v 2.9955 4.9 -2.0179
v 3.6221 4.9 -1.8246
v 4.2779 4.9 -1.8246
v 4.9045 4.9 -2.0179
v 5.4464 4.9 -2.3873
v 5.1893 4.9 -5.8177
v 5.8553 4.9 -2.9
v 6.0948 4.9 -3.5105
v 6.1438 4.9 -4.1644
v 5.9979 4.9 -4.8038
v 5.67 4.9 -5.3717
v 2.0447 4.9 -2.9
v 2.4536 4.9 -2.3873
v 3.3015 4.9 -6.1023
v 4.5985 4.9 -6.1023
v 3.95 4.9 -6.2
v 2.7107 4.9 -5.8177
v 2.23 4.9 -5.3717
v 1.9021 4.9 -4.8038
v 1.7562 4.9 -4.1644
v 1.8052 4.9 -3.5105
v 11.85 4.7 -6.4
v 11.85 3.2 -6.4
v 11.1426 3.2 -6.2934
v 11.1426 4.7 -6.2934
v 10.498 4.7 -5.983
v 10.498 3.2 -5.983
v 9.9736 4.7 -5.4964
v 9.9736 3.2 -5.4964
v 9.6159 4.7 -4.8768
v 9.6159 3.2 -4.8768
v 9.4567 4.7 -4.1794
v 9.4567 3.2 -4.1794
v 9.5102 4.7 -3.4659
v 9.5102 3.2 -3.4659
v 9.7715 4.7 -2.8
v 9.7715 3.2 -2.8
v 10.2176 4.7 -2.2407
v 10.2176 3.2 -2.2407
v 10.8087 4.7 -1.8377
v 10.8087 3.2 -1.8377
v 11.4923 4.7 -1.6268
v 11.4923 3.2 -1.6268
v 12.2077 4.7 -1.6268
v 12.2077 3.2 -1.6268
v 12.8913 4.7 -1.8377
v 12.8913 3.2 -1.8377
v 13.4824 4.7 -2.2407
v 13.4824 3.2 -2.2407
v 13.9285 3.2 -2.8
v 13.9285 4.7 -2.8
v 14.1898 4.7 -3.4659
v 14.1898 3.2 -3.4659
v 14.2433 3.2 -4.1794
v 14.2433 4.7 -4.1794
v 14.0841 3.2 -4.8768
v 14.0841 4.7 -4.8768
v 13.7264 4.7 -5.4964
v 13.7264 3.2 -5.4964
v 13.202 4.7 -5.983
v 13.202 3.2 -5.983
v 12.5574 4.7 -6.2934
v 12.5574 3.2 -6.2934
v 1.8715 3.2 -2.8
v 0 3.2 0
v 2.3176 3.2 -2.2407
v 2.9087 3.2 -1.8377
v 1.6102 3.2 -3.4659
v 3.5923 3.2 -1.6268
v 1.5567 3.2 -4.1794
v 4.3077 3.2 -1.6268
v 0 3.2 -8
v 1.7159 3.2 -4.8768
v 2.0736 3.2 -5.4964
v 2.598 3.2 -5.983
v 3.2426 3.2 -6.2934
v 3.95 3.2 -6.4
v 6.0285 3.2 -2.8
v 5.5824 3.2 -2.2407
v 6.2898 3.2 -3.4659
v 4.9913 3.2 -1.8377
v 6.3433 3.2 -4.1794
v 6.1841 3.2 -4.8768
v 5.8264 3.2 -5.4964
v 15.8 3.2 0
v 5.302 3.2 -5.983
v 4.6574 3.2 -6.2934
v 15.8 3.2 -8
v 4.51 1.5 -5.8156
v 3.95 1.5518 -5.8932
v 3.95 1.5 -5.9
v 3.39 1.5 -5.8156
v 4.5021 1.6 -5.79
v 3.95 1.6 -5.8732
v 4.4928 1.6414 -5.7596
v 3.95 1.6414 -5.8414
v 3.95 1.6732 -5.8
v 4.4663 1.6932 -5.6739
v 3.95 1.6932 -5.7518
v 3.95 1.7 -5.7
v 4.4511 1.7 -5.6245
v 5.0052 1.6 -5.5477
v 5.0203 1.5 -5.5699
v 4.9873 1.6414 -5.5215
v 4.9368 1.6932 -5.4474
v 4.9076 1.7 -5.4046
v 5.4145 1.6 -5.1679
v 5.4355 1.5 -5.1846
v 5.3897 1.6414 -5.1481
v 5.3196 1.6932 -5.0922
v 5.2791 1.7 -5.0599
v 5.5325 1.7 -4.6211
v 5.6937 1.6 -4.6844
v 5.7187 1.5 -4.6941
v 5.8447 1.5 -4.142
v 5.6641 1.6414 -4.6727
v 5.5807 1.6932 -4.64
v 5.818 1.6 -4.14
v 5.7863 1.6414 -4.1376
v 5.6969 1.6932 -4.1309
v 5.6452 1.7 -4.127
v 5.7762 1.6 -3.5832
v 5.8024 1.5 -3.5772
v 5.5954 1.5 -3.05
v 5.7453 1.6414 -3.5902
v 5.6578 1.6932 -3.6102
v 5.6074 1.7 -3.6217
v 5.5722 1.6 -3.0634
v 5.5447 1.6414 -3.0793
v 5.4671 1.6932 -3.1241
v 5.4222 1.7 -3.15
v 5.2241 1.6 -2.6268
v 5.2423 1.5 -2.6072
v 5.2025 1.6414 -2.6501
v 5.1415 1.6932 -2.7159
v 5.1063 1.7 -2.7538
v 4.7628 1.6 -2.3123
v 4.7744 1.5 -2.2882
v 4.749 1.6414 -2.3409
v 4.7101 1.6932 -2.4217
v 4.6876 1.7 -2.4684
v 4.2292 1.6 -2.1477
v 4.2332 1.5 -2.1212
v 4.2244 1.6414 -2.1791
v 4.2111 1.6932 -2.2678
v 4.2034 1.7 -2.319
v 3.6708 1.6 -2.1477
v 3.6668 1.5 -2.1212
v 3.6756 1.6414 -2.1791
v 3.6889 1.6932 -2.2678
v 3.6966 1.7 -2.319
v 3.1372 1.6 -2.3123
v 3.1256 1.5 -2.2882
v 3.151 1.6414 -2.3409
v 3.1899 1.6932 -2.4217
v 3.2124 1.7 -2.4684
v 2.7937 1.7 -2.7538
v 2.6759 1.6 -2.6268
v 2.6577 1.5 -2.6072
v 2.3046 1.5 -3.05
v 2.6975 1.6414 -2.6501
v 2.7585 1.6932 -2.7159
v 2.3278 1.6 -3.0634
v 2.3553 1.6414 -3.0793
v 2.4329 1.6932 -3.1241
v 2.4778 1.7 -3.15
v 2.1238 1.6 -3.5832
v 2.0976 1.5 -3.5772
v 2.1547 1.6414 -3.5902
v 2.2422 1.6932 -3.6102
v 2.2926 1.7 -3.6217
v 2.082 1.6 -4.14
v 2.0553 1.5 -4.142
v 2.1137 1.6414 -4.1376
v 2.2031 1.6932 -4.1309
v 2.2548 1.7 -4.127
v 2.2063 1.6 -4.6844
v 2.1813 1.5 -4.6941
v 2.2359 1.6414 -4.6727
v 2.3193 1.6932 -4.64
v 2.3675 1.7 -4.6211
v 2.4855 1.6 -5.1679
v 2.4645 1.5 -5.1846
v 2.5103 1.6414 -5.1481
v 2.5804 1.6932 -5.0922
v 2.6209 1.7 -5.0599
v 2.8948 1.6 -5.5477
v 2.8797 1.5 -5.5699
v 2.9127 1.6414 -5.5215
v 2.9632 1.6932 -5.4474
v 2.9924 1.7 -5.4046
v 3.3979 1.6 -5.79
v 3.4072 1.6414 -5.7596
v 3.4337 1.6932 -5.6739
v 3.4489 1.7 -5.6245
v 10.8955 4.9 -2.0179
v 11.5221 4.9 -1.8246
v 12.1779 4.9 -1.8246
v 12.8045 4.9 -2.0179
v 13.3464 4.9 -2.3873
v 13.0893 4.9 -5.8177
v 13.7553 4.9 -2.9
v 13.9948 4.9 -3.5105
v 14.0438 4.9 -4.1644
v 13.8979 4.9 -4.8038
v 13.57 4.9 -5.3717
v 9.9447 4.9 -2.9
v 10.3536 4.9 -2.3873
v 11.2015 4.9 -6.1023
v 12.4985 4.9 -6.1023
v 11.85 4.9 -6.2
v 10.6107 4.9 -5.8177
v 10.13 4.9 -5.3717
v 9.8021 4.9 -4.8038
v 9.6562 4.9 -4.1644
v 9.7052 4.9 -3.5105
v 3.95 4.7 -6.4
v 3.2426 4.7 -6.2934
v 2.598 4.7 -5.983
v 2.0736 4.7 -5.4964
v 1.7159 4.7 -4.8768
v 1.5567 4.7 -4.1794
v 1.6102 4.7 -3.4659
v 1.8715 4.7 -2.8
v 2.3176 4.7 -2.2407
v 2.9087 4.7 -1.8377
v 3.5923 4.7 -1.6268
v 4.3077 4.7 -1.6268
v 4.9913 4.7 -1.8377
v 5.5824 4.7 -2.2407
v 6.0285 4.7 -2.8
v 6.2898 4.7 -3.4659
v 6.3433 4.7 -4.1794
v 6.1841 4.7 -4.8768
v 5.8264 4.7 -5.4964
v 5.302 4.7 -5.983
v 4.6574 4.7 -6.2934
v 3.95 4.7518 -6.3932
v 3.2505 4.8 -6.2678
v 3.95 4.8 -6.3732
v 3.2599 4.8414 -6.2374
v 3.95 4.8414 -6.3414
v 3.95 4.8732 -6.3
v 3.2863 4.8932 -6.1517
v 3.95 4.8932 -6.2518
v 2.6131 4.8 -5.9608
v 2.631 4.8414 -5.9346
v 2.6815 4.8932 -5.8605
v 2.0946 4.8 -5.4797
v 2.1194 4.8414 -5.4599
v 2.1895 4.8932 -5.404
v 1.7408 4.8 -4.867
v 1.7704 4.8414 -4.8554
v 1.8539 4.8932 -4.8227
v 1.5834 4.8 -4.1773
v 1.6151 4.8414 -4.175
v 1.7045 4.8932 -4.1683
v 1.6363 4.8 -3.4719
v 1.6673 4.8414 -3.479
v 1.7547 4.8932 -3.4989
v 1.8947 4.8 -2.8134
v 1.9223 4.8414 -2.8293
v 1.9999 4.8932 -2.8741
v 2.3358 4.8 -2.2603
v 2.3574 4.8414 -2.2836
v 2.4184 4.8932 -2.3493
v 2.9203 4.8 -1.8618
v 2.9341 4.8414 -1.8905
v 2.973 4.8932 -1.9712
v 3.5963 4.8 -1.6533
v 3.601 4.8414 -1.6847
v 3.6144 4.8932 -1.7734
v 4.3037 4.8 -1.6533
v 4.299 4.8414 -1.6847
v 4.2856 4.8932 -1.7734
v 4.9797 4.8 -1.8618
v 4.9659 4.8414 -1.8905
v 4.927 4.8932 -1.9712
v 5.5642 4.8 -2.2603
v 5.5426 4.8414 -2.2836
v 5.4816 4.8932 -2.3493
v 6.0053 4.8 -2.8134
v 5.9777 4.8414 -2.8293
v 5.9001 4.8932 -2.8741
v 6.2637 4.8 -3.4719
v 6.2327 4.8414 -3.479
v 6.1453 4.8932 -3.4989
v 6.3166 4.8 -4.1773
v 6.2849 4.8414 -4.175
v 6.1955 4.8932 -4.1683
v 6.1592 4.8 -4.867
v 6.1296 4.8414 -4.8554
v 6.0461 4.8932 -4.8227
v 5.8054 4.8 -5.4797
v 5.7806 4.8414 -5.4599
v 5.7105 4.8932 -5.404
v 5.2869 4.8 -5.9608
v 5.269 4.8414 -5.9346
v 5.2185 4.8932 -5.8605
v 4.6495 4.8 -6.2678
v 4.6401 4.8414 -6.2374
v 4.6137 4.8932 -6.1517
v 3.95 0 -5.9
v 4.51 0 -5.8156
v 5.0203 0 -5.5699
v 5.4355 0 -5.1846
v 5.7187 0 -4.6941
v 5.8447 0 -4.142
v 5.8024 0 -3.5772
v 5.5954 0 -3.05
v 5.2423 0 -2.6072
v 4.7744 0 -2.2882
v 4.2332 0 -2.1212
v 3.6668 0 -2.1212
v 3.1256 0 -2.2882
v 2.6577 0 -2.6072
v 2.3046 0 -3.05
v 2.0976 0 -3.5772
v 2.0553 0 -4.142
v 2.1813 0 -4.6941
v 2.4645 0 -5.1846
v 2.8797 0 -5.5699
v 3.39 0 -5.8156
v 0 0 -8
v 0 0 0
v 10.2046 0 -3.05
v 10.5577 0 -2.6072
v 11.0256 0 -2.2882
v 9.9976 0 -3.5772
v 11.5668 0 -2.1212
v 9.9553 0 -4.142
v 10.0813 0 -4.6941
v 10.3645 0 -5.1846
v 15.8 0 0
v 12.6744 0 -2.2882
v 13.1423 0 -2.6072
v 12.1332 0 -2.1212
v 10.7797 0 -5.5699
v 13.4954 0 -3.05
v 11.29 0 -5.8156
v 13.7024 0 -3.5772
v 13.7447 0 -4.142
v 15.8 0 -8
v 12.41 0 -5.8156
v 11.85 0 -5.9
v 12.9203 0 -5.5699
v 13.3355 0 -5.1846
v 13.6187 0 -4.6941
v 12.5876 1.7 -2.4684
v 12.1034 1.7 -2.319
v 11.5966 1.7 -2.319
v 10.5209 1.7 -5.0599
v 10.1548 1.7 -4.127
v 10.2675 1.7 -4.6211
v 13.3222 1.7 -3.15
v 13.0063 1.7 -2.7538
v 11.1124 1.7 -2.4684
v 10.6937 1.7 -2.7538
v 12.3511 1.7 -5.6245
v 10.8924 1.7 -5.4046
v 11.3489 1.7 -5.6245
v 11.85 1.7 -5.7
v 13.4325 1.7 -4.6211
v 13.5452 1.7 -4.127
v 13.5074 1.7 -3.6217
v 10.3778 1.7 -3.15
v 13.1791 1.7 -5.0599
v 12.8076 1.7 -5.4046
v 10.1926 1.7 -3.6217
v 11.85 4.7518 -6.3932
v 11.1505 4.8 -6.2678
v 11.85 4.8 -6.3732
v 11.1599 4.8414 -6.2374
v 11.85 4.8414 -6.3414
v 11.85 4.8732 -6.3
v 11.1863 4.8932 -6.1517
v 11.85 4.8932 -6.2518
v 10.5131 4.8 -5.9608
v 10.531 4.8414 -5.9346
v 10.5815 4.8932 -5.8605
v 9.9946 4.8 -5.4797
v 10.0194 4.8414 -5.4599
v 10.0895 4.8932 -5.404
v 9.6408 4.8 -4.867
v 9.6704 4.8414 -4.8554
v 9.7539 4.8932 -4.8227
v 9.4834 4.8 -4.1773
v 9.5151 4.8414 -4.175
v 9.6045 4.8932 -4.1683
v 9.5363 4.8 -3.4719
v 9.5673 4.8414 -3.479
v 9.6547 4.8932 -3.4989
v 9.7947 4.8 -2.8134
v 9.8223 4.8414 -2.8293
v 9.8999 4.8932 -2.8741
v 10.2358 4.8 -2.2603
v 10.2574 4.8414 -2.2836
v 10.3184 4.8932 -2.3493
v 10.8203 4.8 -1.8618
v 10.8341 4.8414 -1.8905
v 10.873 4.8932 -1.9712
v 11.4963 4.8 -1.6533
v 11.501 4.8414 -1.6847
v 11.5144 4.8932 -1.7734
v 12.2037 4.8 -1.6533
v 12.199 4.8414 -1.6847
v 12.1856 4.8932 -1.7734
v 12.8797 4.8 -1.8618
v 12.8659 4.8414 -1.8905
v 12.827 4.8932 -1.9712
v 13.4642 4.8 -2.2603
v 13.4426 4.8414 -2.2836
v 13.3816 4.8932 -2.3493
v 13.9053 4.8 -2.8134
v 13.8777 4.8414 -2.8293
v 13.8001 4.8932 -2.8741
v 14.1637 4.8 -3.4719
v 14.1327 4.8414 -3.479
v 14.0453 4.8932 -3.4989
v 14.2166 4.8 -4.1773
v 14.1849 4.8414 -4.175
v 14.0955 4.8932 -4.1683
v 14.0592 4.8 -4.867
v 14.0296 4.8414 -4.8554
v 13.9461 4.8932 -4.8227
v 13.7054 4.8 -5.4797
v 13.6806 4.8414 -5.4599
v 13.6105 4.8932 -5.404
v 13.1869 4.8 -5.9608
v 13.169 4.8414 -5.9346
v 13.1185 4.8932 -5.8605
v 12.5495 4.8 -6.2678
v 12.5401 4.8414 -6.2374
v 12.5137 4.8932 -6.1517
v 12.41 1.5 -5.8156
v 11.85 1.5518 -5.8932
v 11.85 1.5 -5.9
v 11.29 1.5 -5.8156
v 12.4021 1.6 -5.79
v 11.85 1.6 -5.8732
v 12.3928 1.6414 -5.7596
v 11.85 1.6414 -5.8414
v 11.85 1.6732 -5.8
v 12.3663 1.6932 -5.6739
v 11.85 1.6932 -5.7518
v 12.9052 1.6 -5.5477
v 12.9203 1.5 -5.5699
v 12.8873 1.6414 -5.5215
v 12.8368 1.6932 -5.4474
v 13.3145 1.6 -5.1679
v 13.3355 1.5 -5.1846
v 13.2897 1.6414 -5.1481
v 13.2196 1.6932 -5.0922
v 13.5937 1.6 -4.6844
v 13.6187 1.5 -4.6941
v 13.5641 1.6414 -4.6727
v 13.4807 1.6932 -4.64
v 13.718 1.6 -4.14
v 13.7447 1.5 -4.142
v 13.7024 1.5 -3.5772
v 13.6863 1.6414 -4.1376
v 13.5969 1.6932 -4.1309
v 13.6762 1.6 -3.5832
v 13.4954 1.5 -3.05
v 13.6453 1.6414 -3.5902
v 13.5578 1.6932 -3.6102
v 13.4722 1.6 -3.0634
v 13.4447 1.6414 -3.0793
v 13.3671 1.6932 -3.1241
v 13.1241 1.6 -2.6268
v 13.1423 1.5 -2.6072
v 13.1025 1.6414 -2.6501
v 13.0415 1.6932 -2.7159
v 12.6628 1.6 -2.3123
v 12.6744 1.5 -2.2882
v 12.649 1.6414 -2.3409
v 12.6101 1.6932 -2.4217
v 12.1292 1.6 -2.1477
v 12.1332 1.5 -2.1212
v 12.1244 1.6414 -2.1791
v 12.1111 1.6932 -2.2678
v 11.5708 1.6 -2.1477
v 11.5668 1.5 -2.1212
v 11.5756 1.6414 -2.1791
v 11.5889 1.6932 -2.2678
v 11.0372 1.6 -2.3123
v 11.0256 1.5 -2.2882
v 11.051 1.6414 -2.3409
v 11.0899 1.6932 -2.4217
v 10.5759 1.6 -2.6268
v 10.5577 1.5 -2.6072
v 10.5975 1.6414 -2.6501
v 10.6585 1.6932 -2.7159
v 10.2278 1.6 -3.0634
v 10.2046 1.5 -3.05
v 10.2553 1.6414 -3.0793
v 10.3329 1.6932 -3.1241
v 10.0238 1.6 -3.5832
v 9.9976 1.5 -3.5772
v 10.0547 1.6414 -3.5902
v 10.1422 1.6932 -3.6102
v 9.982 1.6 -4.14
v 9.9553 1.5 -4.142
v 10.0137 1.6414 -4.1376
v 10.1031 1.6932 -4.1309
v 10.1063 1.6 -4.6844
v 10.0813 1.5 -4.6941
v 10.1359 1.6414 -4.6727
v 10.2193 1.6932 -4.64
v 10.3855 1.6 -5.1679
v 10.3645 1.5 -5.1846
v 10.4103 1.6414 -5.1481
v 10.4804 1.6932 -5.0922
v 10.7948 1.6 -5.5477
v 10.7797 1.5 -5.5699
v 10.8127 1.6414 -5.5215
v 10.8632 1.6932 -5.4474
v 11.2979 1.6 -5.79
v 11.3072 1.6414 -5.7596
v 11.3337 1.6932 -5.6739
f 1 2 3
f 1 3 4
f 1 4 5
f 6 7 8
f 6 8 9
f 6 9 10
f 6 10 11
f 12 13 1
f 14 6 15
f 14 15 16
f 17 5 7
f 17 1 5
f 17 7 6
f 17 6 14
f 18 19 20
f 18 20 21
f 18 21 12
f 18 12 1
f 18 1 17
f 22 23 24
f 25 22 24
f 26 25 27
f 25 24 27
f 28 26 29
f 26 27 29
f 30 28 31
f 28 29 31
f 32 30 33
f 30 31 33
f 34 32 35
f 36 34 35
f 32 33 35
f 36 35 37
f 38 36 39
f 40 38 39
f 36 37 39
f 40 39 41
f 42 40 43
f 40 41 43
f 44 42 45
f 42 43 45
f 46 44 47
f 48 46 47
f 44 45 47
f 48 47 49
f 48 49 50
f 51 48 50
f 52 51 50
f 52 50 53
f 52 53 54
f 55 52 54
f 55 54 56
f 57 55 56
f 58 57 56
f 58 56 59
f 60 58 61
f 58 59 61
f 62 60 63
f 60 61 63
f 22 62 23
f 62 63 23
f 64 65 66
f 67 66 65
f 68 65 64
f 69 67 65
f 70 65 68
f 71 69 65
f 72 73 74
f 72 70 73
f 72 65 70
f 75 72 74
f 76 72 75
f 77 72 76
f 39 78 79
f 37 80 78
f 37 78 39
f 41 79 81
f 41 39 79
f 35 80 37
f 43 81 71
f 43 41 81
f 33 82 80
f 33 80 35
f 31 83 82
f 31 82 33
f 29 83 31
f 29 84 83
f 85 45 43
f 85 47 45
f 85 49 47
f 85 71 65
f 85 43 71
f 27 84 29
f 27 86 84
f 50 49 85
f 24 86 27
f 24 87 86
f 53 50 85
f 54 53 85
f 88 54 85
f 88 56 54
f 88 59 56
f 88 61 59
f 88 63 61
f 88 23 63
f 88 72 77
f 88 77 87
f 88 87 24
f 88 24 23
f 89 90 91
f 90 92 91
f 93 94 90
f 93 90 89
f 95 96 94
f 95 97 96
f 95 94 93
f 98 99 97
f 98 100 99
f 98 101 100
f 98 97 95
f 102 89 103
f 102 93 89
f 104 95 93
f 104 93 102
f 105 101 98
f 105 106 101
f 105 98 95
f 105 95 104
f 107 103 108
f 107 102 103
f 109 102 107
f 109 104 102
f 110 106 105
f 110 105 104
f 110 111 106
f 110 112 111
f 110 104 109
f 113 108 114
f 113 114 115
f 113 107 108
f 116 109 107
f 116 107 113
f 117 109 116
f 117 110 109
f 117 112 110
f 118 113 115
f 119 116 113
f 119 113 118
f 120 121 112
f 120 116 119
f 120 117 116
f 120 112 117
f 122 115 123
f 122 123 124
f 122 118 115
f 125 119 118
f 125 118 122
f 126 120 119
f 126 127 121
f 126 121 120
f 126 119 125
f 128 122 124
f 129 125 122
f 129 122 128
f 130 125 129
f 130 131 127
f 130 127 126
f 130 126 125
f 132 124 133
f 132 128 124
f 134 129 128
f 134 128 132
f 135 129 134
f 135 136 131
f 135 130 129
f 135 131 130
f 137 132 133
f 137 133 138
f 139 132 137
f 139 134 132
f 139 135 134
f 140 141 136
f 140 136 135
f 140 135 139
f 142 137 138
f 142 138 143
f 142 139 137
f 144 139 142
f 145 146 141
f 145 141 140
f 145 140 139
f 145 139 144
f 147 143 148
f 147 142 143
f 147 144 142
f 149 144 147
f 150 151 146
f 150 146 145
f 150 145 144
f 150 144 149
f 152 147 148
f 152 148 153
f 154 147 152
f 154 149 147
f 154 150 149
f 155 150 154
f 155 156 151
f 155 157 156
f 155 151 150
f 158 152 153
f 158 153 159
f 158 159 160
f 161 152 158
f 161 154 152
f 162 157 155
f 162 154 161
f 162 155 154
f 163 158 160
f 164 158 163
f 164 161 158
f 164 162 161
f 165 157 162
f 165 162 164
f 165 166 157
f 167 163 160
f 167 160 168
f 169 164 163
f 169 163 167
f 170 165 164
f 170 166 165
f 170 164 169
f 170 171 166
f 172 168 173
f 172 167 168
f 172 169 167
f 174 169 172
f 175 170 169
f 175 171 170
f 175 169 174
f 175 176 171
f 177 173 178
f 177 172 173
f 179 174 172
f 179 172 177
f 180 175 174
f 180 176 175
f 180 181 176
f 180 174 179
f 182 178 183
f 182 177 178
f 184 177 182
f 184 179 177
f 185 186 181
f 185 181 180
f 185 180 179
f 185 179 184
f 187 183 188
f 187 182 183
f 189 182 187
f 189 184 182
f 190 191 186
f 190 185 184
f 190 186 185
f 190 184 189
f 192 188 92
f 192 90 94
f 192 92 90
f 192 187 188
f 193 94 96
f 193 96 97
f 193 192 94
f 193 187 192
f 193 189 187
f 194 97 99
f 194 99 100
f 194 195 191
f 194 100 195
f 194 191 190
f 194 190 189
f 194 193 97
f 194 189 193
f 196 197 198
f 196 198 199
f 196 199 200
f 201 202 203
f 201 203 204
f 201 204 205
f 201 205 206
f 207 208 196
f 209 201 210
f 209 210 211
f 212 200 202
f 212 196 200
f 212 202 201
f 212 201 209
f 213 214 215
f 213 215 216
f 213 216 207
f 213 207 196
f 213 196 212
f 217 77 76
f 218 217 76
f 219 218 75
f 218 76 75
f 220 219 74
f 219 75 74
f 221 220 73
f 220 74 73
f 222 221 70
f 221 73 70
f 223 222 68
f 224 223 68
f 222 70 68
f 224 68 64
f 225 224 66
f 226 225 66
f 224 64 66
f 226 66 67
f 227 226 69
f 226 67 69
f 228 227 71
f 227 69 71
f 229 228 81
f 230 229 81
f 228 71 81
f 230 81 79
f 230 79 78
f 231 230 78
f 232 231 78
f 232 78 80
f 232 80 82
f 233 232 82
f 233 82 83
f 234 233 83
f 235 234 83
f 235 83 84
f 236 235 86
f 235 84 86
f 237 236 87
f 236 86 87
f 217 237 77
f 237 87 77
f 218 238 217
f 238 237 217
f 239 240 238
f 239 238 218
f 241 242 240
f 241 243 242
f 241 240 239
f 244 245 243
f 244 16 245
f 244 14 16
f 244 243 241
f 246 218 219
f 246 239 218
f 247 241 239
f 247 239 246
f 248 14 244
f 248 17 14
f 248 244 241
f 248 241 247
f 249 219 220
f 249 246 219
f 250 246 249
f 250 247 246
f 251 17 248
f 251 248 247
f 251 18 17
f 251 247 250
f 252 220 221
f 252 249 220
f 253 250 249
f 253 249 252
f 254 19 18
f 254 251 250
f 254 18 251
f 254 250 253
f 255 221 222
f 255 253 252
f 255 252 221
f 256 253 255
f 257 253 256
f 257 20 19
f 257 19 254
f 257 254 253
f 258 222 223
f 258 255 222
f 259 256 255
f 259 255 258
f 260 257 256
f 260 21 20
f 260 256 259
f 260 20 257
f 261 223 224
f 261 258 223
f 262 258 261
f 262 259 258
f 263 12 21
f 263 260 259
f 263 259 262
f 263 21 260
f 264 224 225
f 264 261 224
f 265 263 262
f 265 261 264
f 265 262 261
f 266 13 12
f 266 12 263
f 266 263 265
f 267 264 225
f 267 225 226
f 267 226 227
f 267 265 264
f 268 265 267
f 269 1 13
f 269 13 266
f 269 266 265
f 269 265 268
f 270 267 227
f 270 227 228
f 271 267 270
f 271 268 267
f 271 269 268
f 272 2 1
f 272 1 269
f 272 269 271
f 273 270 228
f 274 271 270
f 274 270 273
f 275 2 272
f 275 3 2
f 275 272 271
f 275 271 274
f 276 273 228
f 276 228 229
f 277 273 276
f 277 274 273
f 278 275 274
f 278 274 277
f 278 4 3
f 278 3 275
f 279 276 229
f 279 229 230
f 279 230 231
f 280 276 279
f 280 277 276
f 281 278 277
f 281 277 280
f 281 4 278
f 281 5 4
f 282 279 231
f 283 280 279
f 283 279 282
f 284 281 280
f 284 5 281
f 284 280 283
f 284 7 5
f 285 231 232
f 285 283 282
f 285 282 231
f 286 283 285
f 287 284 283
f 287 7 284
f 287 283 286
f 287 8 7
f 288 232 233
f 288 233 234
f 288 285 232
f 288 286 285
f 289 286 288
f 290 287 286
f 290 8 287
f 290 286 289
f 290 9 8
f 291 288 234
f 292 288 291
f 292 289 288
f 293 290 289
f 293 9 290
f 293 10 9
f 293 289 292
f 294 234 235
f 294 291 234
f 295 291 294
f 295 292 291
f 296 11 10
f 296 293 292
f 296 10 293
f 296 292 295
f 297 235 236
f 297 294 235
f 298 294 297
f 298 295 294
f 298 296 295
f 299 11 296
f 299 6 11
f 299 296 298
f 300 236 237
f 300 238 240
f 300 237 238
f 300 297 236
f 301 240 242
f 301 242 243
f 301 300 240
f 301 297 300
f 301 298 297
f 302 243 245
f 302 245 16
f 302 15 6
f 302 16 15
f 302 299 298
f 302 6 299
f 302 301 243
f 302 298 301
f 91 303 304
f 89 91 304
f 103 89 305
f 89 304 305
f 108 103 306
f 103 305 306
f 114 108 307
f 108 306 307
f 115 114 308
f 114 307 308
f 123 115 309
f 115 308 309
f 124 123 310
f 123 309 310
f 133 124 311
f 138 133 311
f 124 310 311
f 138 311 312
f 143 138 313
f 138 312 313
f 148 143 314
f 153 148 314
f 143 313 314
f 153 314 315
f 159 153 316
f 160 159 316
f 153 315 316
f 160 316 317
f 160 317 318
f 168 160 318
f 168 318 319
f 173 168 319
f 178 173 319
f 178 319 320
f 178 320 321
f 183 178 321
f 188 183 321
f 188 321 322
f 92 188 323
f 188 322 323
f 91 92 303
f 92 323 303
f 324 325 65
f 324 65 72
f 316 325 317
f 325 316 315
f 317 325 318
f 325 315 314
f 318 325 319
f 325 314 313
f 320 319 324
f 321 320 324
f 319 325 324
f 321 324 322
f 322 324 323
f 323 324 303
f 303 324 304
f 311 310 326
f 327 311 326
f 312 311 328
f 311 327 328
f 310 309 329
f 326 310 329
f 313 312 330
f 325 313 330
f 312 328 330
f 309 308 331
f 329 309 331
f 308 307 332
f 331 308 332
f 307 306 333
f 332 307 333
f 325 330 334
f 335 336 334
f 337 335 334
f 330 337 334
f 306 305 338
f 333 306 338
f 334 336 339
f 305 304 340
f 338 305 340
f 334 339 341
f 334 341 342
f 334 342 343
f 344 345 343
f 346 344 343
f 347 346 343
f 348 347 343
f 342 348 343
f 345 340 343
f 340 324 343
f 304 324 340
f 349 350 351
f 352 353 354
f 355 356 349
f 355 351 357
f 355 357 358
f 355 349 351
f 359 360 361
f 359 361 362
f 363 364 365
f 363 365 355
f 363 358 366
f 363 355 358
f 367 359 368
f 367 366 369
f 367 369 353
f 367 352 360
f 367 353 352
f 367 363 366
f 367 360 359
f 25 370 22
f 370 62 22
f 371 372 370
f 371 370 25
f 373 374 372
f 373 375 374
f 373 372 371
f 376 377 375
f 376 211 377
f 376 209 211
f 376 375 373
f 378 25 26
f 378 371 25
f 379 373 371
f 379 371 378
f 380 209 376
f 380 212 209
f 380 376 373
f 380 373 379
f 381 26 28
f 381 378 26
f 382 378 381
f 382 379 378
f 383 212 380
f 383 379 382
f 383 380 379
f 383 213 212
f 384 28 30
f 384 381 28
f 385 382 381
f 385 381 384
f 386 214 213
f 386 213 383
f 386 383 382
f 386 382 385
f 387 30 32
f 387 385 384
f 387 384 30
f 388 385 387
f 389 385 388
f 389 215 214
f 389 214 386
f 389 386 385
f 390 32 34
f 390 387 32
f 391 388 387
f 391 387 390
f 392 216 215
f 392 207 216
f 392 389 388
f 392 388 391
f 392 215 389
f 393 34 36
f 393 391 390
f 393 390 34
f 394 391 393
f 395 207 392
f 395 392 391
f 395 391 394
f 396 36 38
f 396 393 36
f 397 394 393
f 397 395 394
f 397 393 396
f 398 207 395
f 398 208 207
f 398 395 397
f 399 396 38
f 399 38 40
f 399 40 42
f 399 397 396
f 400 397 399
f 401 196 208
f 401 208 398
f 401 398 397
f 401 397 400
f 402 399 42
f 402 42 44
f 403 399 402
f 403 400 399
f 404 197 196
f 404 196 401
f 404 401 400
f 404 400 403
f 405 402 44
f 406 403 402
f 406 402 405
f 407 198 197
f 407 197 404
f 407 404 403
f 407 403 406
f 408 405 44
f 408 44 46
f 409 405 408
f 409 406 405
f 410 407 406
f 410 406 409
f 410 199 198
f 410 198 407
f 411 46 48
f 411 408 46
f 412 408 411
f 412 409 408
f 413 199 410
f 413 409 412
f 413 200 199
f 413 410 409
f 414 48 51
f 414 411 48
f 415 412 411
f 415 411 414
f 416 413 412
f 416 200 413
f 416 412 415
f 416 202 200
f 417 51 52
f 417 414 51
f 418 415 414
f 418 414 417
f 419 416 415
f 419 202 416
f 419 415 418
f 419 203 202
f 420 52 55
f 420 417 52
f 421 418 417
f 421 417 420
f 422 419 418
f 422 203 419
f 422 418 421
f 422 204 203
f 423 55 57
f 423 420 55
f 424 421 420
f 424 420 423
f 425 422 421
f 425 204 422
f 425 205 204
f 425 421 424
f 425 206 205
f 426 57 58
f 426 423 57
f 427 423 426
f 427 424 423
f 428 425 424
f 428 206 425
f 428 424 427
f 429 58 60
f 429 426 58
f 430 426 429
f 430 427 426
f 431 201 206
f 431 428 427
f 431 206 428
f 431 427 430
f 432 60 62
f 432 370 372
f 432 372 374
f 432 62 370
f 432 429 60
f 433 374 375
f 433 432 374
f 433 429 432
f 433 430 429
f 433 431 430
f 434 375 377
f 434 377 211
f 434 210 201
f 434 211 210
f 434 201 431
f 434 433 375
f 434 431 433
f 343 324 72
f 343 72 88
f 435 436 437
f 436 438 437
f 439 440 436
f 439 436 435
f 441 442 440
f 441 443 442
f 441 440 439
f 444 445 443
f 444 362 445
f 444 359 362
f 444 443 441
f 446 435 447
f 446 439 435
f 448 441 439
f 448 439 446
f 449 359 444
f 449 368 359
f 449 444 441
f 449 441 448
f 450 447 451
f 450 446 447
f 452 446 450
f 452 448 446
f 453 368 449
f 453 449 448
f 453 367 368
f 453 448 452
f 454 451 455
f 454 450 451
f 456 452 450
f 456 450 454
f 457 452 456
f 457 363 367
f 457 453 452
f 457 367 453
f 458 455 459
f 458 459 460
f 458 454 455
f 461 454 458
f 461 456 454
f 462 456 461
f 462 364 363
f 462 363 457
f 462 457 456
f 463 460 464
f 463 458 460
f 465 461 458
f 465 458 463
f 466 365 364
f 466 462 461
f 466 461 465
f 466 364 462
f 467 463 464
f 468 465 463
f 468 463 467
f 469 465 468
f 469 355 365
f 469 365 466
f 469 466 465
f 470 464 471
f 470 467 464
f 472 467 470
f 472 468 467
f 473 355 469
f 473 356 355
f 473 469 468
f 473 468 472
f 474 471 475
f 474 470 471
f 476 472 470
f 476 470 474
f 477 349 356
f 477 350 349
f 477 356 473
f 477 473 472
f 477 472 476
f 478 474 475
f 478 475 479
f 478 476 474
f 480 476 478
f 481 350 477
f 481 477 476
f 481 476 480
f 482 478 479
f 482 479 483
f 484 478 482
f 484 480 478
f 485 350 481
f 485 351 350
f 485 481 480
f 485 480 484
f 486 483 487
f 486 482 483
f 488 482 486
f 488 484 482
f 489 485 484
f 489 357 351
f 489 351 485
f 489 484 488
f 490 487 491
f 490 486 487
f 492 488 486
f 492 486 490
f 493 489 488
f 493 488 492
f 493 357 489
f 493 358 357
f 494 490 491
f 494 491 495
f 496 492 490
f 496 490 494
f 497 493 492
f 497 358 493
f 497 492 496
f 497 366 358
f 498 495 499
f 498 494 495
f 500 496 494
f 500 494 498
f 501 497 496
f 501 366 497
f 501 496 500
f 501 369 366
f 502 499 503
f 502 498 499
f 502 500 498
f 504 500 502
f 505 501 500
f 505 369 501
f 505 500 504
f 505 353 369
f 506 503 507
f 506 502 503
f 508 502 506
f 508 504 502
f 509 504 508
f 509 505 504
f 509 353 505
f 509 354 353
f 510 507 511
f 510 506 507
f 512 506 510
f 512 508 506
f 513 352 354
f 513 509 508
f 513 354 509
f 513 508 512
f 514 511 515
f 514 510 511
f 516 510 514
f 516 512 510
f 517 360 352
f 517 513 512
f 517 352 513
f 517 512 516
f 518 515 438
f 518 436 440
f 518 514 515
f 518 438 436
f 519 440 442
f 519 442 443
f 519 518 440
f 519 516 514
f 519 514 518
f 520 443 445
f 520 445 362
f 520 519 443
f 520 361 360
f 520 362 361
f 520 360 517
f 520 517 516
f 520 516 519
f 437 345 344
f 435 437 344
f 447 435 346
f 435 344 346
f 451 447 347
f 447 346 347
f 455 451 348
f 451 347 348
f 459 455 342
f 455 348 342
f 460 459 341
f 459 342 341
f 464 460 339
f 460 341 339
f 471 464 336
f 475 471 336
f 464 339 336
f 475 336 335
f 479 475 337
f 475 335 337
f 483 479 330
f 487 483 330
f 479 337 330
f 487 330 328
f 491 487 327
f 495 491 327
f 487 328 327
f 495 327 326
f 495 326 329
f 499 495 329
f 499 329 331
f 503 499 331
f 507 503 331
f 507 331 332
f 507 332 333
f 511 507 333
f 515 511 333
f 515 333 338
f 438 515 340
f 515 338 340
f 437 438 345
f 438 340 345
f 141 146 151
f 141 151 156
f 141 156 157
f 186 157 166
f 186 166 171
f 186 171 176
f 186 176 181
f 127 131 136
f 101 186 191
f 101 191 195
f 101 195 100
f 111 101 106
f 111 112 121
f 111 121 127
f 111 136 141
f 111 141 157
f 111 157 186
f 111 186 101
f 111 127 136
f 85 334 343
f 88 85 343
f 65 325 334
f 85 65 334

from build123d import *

# Parameters (mm, degrees)
ESQUISSE1_W             = 15.8
ESQUISSE1_H             = 8
BOSS_EXTRU_1_DEPTH      = 3.2
ESQUISSE2_R             = 2.4
BOSS_EXTRU_2_DEPTH      = 1.7
ESQUISSE3_R             = 1.9
ENL_V_MAT_EXTRU_1_DEPTH = 1.7
CONG_1_R                = 0.2


with BuildPart() as part:
    # Esquisse1 → Boss.-Extru.1 (new body)
    with BuildSketch(Plane(origin=(0, 0, 0), x_dir=(1, 0, 0), z_dir=(0, 1, 0))):
        with Locations((7.9, 4)):
            Rectangle(ESQUISSE1_W, ESQUISSE1_H)
    extrude(amount=BOSS_EXTRU_1_DEPTH)

    # Esquisse2 → Boss.-Extru.2 (add)
    with BuildSketch(Plane(origin=(0, 3.2, 0), x_dir=(1, 0, 0), z_dir=(0, 1, 0))):
        with Locations(Location((3.95, 4, 0), (0, 0, 90))):
            Circle(ESQUISSE2_R)
        with Locations(Location((11.85, 4, 0), (0, 0, 90))):
            Circle(ESQUISSE2_R)
    extrude(amount=BOSS_EXTRU_2_DEPTH)

    # Esquisse3 → Enlèv. mat.-Extru.1 (cut)
    with BuildSketch(Plane.XZ):
        with Locations(Location((3.95, -4, 0), (0, 0, 270))):
            Circle(ESQUISSE3_R)
        with Locations(Location((11.85, -4, 0), (0, 0, 270))):
            Circle(ESQUISSE3_R)
    extrude(amount=-ENL_V_MAT_EXTRU_1_DEPTH, mode=Mode.SUBTRACT)

    # Congé1
    cong_1_edges = [part.edges().sort_by_distance(p)[0] for p in [
        (3.95, 4.9, -1.6),
        (11.85, 4.9, -1.6),
        (3.95, 1.7, -2.1),
        (11.85, 1.7, -2.1),
    ]]
    fillet(cong_1_edges, radius=CONG_1_R)


solid = part.part
